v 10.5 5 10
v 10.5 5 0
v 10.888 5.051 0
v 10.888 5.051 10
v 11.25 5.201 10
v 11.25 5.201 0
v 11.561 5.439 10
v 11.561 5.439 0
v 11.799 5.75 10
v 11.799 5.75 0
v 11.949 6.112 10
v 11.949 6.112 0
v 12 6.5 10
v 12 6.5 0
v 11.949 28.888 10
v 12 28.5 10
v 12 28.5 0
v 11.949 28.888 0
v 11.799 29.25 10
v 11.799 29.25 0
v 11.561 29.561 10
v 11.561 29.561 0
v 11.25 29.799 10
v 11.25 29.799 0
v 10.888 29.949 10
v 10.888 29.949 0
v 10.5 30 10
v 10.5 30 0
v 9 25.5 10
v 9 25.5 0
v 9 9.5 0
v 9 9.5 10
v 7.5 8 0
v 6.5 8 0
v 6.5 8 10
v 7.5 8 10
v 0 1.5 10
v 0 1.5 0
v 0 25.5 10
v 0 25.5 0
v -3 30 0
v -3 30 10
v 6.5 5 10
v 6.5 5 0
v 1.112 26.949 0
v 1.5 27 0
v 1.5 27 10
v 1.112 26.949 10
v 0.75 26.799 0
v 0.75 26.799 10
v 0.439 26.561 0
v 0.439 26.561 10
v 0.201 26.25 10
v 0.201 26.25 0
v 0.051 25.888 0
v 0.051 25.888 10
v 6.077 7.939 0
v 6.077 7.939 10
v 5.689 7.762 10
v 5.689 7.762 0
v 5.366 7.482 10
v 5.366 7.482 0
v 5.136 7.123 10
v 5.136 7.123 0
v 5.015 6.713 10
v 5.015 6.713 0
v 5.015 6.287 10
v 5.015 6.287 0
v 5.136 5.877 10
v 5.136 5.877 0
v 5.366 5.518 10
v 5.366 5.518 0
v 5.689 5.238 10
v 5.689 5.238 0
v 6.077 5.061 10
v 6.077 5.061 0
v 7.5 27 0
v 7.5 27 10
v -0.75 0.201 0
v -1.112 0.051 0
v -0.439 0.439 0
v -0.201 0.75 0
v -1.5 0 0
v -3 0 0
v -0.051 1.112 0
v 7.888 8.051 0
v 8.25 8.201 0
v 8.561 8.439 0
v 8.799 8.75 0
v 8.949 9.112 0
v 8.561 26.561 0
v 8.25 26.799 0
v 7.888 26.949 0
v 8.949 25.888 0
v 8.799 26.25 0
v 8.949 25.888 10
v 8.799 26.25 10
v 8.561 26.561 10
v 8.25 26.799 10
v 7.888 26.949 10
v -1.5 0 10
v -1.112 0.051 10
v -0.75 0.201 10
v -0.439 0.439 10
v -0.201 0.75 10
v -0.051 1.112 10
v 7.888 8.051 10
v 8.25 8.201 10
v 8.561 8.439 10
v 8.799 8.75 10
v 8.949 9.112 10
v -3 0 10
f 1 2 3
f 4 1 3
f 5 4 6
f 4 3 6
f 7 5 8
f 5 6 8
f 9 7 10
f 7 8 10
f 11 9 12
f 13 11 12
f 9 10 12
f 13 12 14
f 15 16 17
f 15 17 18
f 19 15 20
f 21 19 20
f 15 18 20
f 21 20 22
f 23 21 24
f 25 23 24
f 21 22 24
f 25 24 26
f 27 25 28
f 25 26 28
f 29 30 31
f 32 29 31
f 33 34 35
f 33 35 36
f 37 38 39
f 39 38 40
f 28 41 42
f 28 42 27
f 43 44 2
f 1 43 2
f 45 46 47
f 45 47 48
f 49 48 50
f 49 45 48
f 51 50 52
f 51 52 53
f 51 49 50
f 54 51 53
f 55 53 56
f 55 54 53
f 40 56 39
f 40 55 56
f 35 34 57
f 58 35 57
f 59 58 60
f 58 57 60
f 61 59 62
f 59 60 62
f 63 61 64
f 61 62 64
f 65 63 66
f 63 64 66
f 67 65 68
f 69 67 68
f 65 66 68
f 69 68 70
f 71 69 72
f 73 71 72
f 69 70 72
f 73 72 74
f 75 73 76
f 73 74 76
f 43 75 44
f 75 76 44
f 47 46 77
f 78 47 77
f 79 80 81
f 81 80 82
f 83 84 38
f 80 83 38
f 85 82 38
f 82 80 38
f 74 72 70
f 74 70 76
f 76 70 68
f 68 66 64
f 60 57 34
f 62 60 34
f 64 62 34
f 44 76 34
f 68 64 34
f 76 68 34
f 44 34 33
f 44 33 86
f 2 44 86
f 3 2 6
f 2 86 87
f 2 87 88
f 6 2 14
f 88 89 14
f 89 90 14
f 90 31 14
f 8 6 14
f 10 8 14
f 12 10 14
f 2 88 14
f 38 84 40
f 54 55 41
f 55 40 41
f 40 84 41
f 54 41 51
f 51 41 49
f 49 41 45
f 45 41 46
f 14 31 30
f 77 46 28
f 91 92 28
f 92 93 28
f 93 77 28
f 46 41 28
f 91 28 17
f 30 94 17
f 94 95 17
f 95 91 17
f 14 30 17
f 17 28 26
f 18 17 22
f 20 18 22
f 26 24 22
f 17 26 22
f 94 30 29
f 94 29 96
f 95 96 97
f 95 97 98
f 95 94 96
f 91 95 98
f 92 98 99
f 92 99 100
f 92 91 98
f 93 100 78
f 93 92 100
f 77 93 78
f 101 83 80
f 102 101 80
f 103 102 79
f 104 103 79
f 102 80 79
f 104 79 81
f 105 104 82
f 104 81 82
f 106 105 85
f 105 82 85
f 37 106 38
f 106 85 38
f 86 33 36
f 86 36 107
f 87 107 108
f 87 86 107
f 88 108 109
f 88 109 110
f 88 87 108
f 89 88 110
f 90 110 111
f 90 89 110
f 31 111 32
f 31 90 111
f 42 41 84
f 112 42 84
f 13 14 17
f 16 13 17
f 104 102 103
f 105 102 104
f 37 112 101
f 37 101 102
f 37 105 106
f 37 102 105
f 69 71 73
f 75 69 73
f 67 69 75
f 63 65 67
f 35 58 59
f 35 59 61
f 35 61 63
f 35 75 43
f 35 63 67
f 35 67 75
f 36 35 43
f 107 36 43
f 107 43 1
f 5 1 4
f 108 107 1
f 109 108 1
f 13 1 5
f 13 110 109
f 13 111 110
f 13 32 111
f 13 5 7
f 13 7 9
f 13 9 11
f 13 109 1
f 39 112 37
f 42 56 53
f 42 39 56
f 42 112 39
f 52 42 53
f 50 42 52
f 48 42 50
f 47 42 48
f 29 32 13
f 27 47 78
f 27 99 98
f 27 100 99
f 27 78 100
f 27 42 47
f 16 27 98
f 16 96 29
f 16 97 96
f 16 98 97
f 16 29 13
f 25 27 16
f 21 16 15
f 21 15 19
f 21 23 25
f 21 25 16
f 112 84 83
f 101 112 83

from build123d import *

# Parameters (mm, degrees)
PAD_DEPTH = 10


with BuildPart() as part:
    # Sketch → Pad (new body)
    with BuildSketch(Plane.XY):
        with BuildLine():
            Line((-3, 30), (-3, 0))
            Line((-3, 0), (-1.500009, 0))
            ThreePointArc((-1.500009, 0), (-0.439343, 0.439336), (0, 1.499999))
            Line((0, 1.499999), (0, 25.5))
            ThreePointArc((1.5, 27), (0.43934, 26.56066), (0, 25.5))
            Line((1.5, 27), (7.5, 27))
            ThreePointArc((9, 25.5), (8.56066, 26.56066), (7.5, 27))
            Line((9, 25.5), (9, 9.5))
            ThreePointArc((7.5, 8), (8.56066, 8.43934), (9, 9.5))
            Line((6.5, 8), (7.5, 8))
            ThreePointArc((6.5, 8), (5, 6.5), (6.5, 5))
            Line((6.5, 5), (10.5, 5))
            ThreePointArc((10.5, 5), (11.56066, 5.43934), (12, 6.5))
            Line((12, 6.5), (12, 28.500001))
            ThreePointArc((12, 28.500001), (11.56066, 29.560661), (10.5, 30))
            Line((-3, 30), (10.5, 30))
        make_face()
    extrude(amount=PAD_DEPTH)


solid = part.part
